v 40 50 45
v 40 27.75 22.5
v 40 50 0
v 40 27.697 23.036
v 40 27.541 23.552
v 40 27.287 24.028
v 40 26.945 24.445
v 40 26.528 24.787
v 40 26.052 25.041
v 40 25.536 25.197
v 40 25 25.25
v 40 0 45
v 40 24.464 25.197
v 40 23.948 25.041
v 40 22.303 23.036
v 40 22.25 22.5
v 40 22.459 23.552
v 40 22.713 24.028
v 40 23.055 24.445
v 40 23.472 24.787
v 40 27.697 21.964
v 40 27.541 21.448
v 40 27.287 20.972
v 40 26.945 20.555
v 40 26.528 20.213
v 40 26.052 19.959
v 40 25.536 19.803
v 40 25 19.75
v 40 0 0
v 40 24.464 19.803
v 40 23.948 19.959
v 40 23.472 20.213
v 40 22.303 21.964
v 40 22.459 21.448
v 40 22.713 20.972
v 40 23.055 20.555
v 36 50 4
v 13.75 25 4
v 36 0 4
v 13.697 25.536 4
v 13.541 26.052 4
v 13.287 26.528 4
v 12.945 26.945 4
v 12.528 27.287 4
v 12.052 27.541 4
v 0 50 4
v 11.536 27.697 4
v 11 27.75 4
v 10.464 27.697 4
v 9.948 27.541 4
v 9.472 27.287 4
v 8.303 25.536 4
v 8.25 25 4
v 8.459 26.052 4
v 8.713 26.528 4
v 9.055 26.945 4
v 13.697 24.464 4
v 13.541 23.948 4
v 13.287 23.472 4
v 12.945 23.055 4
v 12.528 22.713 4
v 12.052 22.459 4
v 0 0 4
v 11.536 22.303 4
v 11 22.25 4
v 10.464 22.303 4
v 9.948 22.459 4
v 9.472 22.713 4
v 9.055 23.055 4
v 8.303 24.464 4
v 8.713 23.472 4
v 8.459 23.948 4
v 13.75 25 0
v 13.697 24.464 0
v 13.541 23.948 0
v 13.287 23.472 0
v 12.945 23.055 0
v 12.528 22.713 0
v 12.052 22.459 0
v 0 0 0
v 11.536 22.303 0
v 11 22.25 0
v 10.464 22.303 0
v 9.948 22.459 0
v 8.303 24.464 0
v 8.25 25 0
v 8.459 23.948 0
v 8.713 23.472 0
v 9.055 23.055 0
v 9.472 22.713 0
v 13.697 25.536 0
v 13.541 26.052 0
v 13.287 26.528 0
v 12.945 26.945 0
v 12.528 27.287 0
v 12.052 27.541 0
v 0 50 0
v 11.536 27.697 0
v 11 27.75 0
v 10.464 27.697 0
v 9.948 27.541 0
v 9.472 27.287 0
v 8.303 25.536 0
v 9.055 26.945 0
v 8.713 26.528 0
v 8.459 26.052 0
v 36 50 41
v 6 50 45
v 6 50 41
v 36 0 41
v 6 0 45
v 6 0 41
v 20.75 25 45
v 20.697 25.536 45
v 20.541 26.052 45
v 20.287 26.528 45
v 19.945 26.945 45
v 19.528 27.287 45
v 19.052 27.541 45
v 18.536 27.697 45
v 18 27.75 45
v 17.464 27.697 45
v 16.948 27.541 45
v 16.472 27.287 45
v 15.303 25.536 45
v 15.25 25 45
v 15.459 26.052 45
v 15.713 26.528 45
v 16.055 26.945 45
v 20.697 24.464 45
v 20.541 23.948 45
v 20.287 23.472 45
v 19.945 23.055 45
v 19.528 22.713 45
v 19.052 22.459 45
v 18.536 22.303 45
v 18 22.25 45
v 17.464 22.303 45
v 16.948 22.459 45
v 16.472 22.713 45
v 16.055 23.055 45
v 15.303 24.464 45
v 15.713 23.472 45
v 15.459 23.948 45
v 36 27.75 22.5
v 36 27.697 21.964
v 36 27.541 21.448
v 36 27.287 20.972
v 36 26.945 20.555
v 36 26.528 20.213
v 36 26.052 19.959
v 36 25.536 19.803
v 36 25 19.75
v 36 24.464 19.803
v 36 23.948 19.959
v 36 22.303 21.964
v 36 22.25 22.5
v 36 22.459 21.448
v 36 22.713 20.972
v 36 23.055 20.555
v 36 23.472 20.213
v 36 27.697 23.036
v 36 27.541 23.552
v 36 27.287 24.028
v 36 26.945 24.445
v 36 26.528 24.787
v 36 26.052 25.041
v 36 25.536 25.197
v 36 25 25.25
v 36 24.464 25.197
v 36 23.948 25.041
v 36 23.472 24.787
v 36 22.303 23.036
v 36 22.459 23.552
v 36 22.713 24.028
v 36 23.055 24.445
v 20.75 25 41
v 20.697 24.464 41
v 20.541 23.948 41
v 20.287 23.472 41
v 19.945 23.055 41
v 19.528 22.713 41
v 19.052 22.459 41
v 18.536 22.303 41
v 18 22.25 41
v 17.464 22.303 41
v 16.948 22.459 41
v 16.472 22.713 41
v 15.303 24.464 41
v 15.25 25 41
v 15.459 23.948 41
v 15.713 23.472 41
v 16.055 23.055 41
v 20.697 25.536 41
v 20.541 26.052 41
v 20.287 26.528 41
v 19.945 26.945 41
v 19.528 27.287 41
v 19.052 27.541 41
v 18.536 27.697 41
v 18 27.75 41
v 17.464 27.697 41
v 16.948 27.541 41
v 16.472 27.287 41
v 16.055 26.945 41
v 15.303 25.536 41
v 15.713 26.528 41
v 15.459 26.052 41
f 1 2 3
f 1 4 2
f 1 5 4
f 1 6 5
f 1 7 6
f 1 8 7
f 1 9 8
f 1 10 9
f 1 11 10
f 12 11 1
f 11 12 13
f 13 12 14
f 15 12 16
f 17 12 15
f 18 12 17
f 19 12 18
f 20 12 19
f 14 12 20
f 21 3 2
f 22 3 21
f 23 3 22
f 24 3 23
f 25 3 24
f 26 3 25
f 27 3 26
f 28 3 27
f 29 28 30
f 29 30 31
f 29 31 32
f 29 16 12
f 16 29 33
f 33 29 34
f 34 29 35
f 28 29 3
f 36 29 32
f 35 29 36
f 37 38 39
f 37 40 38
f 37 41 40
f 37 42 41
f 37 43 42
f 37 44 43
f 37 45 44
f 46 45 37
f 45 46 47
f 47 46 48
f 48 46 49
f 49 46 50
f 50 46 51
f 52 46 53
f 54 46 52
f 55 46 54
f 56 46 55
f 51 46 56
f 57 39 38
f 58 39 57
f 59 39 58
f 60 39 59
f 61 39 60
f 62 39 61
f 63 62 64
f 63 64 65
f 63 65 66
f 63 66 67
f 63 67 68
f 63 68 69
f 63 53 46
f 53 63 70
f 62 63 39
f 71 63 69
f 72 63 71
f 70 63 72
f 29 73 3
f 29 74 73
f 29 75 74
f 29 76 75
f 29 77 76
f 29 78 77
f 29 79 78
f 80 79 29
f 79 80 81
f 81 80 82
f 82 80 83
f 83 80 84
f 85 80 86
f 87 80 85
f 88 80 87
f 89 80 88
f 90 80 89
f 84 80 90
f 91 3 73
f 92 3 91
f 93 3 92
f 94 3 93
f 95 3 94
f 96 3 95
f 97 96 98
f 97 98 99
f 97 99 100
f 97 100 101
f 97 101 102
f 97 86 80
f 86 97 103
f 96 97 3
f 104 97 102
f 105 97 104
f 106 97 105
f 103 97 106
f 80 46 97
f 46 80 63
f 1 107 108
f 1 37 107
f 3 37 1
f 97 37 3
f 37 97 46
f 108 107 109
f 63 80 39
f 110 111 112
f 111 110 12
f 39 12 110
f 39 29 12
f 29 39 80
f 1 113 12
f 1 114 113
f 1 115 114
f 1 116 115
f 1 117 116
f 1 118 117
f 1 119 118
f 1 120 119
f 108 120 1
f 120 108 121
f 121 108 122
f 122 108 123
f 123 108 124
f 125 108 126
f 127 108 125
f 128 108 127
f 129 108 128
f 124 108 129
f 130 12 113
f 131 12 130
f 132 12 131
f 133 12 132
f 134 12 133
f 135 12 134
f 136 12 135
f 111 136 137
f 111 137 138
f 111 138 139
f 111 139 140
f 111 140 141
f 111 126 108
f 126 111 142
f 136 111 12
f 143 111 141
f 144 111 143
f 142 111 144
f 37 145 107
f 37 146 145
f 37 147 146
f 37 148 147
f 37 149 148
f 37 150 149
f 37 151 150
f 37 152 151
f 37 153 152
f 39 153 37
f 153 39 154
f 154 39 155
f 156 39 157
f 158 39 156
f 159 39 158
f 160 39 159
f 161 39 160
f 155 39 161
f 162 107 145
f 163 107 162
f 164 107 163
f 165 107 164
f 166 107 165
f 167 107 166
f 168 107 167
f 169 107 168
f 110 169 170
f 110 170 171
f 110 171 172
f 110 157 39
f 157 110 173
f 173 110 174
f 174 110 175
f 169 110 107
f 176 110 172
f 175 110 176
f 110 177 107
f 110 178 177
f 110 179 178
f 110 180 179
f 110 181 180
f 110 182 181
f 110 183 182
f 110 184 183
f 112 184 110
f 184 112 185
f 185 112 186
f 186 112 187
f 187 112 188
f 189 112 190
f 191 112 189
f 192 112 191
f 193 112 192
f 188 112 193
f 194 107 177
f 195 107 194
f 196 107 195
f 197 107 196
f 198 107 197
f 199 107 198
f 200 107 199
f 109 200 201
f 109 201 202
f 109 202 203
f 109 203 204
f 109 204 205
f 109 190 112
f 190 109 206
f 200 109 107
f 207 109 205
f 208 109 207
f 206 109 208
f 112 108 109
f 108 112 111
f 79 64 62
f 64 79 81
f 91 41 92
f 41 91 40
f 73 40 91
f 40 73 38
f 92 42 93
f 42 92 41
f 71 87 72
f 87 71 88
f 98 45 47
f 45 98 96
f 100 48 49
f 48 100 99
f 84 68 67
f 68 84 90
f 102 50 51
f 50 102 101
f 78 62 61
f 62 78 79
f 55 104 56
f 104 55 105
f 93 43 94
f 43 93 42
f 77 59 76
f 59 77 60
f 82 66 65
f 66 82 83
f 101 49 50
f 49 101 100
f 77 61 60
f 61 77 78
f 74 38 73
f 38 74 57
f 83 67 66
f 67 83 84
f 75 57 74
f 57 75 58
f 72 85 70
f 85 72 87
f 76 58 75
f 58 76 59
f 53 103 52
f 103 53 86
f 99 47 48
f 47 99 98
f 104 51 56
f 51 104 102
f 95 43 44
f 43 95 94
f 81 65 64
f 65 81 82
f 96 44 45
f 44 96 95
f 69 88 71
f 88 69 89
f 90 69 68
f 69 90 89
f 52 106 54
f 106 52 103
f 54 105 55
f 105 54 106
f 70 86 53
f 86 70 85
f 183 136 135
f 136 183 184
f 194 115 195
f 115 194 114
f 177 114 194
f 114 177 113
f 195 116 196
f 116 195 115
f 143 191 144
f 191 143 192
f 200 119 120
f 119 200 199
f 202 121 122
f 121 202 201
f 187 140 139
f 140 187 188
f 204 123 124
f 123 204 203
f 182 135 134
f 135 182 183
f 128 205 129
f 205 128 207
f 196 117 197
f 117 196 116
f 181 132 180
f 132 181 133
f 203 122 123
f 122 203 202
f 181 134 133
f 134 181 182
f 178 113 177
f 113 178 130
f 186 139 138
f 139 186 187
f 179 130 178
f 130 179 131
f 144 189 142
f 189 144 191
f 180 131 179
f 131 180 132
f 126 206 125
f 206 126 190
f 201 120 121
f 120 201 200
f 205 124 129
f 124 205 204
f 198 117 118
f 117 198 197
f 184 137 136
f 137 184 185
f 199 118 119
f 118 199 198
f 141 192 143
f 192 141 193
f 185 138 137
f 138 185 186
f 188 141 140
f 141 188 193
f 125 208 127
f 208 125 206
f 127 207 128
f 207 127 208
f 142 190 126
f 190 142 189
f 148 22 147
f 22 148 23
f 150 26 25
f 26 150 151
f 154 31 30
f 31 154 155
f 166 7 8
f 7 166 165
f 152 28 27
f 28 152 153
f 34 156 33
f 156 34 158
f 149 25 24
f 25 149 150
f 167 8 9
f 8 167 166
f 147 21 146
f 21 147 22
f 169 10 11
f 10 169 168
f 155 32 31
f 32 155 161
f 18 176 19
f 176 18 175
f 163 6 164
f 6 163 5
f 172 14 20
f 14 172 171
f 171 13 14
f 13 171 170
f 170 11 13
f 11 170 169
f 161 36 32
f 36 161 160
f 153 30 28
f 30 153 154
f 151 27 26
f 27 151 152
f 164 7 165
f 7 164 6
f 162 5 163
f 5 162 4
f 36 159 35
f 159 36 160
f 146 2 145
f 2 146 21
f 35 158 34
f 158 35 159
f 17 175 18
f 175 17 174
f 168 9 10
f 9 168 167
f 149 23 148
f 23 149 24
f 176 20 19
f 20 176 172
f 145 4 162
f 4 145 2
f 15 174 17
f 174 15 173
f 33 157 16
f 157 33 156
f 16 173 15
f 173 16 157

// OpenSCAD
$fn = 32;

// ----------------------------------------------------------------------
// Z-bracket: 40 x 50 x 45 mm
// ----------------------------------------------------------------------

// --- parameters (mm) ---
lower_len = 40;           // lower foot length, X
upper_len = 30;           // upper foot length, X
width = 50;               // bracket width, Y
rise = 45;                // overall rise, Z
thick = 4;                // plate thickness
hole_d = 5.5;             // clearance for M5

module hole_z(px, py, z0) {
  translate([px, py, z0 - 2.5]) cylinder(h = thick + 5, d = hole_d);
}
module hole_x(py, pz) {
  translate([-2.5, py, pz]) rotate([0, 90, 0]) cylinder(h = thick + 5, d = hole_d);
}

difference() {
  union() {
    cube([lower_len, width, thick]);
    /* web, overlapping the lower foot */
    translate([lower_len - thick, 0, 0]) cube([thick, width, rise]);
    /* upper foot, sunk into the web */
    translate([lower_len - thick - upper_len, 0, rise - thick]) cube([upper_len + thick, width, thick]);
  }
  hole_z(11, 25, 0);
  translate([lower_len - thick - 18, 0, 0]) hole_z(0, 25, rise - thick);
  translate([lower_len - thick, 0, 0]) hole_x(25, 22.5);
}
